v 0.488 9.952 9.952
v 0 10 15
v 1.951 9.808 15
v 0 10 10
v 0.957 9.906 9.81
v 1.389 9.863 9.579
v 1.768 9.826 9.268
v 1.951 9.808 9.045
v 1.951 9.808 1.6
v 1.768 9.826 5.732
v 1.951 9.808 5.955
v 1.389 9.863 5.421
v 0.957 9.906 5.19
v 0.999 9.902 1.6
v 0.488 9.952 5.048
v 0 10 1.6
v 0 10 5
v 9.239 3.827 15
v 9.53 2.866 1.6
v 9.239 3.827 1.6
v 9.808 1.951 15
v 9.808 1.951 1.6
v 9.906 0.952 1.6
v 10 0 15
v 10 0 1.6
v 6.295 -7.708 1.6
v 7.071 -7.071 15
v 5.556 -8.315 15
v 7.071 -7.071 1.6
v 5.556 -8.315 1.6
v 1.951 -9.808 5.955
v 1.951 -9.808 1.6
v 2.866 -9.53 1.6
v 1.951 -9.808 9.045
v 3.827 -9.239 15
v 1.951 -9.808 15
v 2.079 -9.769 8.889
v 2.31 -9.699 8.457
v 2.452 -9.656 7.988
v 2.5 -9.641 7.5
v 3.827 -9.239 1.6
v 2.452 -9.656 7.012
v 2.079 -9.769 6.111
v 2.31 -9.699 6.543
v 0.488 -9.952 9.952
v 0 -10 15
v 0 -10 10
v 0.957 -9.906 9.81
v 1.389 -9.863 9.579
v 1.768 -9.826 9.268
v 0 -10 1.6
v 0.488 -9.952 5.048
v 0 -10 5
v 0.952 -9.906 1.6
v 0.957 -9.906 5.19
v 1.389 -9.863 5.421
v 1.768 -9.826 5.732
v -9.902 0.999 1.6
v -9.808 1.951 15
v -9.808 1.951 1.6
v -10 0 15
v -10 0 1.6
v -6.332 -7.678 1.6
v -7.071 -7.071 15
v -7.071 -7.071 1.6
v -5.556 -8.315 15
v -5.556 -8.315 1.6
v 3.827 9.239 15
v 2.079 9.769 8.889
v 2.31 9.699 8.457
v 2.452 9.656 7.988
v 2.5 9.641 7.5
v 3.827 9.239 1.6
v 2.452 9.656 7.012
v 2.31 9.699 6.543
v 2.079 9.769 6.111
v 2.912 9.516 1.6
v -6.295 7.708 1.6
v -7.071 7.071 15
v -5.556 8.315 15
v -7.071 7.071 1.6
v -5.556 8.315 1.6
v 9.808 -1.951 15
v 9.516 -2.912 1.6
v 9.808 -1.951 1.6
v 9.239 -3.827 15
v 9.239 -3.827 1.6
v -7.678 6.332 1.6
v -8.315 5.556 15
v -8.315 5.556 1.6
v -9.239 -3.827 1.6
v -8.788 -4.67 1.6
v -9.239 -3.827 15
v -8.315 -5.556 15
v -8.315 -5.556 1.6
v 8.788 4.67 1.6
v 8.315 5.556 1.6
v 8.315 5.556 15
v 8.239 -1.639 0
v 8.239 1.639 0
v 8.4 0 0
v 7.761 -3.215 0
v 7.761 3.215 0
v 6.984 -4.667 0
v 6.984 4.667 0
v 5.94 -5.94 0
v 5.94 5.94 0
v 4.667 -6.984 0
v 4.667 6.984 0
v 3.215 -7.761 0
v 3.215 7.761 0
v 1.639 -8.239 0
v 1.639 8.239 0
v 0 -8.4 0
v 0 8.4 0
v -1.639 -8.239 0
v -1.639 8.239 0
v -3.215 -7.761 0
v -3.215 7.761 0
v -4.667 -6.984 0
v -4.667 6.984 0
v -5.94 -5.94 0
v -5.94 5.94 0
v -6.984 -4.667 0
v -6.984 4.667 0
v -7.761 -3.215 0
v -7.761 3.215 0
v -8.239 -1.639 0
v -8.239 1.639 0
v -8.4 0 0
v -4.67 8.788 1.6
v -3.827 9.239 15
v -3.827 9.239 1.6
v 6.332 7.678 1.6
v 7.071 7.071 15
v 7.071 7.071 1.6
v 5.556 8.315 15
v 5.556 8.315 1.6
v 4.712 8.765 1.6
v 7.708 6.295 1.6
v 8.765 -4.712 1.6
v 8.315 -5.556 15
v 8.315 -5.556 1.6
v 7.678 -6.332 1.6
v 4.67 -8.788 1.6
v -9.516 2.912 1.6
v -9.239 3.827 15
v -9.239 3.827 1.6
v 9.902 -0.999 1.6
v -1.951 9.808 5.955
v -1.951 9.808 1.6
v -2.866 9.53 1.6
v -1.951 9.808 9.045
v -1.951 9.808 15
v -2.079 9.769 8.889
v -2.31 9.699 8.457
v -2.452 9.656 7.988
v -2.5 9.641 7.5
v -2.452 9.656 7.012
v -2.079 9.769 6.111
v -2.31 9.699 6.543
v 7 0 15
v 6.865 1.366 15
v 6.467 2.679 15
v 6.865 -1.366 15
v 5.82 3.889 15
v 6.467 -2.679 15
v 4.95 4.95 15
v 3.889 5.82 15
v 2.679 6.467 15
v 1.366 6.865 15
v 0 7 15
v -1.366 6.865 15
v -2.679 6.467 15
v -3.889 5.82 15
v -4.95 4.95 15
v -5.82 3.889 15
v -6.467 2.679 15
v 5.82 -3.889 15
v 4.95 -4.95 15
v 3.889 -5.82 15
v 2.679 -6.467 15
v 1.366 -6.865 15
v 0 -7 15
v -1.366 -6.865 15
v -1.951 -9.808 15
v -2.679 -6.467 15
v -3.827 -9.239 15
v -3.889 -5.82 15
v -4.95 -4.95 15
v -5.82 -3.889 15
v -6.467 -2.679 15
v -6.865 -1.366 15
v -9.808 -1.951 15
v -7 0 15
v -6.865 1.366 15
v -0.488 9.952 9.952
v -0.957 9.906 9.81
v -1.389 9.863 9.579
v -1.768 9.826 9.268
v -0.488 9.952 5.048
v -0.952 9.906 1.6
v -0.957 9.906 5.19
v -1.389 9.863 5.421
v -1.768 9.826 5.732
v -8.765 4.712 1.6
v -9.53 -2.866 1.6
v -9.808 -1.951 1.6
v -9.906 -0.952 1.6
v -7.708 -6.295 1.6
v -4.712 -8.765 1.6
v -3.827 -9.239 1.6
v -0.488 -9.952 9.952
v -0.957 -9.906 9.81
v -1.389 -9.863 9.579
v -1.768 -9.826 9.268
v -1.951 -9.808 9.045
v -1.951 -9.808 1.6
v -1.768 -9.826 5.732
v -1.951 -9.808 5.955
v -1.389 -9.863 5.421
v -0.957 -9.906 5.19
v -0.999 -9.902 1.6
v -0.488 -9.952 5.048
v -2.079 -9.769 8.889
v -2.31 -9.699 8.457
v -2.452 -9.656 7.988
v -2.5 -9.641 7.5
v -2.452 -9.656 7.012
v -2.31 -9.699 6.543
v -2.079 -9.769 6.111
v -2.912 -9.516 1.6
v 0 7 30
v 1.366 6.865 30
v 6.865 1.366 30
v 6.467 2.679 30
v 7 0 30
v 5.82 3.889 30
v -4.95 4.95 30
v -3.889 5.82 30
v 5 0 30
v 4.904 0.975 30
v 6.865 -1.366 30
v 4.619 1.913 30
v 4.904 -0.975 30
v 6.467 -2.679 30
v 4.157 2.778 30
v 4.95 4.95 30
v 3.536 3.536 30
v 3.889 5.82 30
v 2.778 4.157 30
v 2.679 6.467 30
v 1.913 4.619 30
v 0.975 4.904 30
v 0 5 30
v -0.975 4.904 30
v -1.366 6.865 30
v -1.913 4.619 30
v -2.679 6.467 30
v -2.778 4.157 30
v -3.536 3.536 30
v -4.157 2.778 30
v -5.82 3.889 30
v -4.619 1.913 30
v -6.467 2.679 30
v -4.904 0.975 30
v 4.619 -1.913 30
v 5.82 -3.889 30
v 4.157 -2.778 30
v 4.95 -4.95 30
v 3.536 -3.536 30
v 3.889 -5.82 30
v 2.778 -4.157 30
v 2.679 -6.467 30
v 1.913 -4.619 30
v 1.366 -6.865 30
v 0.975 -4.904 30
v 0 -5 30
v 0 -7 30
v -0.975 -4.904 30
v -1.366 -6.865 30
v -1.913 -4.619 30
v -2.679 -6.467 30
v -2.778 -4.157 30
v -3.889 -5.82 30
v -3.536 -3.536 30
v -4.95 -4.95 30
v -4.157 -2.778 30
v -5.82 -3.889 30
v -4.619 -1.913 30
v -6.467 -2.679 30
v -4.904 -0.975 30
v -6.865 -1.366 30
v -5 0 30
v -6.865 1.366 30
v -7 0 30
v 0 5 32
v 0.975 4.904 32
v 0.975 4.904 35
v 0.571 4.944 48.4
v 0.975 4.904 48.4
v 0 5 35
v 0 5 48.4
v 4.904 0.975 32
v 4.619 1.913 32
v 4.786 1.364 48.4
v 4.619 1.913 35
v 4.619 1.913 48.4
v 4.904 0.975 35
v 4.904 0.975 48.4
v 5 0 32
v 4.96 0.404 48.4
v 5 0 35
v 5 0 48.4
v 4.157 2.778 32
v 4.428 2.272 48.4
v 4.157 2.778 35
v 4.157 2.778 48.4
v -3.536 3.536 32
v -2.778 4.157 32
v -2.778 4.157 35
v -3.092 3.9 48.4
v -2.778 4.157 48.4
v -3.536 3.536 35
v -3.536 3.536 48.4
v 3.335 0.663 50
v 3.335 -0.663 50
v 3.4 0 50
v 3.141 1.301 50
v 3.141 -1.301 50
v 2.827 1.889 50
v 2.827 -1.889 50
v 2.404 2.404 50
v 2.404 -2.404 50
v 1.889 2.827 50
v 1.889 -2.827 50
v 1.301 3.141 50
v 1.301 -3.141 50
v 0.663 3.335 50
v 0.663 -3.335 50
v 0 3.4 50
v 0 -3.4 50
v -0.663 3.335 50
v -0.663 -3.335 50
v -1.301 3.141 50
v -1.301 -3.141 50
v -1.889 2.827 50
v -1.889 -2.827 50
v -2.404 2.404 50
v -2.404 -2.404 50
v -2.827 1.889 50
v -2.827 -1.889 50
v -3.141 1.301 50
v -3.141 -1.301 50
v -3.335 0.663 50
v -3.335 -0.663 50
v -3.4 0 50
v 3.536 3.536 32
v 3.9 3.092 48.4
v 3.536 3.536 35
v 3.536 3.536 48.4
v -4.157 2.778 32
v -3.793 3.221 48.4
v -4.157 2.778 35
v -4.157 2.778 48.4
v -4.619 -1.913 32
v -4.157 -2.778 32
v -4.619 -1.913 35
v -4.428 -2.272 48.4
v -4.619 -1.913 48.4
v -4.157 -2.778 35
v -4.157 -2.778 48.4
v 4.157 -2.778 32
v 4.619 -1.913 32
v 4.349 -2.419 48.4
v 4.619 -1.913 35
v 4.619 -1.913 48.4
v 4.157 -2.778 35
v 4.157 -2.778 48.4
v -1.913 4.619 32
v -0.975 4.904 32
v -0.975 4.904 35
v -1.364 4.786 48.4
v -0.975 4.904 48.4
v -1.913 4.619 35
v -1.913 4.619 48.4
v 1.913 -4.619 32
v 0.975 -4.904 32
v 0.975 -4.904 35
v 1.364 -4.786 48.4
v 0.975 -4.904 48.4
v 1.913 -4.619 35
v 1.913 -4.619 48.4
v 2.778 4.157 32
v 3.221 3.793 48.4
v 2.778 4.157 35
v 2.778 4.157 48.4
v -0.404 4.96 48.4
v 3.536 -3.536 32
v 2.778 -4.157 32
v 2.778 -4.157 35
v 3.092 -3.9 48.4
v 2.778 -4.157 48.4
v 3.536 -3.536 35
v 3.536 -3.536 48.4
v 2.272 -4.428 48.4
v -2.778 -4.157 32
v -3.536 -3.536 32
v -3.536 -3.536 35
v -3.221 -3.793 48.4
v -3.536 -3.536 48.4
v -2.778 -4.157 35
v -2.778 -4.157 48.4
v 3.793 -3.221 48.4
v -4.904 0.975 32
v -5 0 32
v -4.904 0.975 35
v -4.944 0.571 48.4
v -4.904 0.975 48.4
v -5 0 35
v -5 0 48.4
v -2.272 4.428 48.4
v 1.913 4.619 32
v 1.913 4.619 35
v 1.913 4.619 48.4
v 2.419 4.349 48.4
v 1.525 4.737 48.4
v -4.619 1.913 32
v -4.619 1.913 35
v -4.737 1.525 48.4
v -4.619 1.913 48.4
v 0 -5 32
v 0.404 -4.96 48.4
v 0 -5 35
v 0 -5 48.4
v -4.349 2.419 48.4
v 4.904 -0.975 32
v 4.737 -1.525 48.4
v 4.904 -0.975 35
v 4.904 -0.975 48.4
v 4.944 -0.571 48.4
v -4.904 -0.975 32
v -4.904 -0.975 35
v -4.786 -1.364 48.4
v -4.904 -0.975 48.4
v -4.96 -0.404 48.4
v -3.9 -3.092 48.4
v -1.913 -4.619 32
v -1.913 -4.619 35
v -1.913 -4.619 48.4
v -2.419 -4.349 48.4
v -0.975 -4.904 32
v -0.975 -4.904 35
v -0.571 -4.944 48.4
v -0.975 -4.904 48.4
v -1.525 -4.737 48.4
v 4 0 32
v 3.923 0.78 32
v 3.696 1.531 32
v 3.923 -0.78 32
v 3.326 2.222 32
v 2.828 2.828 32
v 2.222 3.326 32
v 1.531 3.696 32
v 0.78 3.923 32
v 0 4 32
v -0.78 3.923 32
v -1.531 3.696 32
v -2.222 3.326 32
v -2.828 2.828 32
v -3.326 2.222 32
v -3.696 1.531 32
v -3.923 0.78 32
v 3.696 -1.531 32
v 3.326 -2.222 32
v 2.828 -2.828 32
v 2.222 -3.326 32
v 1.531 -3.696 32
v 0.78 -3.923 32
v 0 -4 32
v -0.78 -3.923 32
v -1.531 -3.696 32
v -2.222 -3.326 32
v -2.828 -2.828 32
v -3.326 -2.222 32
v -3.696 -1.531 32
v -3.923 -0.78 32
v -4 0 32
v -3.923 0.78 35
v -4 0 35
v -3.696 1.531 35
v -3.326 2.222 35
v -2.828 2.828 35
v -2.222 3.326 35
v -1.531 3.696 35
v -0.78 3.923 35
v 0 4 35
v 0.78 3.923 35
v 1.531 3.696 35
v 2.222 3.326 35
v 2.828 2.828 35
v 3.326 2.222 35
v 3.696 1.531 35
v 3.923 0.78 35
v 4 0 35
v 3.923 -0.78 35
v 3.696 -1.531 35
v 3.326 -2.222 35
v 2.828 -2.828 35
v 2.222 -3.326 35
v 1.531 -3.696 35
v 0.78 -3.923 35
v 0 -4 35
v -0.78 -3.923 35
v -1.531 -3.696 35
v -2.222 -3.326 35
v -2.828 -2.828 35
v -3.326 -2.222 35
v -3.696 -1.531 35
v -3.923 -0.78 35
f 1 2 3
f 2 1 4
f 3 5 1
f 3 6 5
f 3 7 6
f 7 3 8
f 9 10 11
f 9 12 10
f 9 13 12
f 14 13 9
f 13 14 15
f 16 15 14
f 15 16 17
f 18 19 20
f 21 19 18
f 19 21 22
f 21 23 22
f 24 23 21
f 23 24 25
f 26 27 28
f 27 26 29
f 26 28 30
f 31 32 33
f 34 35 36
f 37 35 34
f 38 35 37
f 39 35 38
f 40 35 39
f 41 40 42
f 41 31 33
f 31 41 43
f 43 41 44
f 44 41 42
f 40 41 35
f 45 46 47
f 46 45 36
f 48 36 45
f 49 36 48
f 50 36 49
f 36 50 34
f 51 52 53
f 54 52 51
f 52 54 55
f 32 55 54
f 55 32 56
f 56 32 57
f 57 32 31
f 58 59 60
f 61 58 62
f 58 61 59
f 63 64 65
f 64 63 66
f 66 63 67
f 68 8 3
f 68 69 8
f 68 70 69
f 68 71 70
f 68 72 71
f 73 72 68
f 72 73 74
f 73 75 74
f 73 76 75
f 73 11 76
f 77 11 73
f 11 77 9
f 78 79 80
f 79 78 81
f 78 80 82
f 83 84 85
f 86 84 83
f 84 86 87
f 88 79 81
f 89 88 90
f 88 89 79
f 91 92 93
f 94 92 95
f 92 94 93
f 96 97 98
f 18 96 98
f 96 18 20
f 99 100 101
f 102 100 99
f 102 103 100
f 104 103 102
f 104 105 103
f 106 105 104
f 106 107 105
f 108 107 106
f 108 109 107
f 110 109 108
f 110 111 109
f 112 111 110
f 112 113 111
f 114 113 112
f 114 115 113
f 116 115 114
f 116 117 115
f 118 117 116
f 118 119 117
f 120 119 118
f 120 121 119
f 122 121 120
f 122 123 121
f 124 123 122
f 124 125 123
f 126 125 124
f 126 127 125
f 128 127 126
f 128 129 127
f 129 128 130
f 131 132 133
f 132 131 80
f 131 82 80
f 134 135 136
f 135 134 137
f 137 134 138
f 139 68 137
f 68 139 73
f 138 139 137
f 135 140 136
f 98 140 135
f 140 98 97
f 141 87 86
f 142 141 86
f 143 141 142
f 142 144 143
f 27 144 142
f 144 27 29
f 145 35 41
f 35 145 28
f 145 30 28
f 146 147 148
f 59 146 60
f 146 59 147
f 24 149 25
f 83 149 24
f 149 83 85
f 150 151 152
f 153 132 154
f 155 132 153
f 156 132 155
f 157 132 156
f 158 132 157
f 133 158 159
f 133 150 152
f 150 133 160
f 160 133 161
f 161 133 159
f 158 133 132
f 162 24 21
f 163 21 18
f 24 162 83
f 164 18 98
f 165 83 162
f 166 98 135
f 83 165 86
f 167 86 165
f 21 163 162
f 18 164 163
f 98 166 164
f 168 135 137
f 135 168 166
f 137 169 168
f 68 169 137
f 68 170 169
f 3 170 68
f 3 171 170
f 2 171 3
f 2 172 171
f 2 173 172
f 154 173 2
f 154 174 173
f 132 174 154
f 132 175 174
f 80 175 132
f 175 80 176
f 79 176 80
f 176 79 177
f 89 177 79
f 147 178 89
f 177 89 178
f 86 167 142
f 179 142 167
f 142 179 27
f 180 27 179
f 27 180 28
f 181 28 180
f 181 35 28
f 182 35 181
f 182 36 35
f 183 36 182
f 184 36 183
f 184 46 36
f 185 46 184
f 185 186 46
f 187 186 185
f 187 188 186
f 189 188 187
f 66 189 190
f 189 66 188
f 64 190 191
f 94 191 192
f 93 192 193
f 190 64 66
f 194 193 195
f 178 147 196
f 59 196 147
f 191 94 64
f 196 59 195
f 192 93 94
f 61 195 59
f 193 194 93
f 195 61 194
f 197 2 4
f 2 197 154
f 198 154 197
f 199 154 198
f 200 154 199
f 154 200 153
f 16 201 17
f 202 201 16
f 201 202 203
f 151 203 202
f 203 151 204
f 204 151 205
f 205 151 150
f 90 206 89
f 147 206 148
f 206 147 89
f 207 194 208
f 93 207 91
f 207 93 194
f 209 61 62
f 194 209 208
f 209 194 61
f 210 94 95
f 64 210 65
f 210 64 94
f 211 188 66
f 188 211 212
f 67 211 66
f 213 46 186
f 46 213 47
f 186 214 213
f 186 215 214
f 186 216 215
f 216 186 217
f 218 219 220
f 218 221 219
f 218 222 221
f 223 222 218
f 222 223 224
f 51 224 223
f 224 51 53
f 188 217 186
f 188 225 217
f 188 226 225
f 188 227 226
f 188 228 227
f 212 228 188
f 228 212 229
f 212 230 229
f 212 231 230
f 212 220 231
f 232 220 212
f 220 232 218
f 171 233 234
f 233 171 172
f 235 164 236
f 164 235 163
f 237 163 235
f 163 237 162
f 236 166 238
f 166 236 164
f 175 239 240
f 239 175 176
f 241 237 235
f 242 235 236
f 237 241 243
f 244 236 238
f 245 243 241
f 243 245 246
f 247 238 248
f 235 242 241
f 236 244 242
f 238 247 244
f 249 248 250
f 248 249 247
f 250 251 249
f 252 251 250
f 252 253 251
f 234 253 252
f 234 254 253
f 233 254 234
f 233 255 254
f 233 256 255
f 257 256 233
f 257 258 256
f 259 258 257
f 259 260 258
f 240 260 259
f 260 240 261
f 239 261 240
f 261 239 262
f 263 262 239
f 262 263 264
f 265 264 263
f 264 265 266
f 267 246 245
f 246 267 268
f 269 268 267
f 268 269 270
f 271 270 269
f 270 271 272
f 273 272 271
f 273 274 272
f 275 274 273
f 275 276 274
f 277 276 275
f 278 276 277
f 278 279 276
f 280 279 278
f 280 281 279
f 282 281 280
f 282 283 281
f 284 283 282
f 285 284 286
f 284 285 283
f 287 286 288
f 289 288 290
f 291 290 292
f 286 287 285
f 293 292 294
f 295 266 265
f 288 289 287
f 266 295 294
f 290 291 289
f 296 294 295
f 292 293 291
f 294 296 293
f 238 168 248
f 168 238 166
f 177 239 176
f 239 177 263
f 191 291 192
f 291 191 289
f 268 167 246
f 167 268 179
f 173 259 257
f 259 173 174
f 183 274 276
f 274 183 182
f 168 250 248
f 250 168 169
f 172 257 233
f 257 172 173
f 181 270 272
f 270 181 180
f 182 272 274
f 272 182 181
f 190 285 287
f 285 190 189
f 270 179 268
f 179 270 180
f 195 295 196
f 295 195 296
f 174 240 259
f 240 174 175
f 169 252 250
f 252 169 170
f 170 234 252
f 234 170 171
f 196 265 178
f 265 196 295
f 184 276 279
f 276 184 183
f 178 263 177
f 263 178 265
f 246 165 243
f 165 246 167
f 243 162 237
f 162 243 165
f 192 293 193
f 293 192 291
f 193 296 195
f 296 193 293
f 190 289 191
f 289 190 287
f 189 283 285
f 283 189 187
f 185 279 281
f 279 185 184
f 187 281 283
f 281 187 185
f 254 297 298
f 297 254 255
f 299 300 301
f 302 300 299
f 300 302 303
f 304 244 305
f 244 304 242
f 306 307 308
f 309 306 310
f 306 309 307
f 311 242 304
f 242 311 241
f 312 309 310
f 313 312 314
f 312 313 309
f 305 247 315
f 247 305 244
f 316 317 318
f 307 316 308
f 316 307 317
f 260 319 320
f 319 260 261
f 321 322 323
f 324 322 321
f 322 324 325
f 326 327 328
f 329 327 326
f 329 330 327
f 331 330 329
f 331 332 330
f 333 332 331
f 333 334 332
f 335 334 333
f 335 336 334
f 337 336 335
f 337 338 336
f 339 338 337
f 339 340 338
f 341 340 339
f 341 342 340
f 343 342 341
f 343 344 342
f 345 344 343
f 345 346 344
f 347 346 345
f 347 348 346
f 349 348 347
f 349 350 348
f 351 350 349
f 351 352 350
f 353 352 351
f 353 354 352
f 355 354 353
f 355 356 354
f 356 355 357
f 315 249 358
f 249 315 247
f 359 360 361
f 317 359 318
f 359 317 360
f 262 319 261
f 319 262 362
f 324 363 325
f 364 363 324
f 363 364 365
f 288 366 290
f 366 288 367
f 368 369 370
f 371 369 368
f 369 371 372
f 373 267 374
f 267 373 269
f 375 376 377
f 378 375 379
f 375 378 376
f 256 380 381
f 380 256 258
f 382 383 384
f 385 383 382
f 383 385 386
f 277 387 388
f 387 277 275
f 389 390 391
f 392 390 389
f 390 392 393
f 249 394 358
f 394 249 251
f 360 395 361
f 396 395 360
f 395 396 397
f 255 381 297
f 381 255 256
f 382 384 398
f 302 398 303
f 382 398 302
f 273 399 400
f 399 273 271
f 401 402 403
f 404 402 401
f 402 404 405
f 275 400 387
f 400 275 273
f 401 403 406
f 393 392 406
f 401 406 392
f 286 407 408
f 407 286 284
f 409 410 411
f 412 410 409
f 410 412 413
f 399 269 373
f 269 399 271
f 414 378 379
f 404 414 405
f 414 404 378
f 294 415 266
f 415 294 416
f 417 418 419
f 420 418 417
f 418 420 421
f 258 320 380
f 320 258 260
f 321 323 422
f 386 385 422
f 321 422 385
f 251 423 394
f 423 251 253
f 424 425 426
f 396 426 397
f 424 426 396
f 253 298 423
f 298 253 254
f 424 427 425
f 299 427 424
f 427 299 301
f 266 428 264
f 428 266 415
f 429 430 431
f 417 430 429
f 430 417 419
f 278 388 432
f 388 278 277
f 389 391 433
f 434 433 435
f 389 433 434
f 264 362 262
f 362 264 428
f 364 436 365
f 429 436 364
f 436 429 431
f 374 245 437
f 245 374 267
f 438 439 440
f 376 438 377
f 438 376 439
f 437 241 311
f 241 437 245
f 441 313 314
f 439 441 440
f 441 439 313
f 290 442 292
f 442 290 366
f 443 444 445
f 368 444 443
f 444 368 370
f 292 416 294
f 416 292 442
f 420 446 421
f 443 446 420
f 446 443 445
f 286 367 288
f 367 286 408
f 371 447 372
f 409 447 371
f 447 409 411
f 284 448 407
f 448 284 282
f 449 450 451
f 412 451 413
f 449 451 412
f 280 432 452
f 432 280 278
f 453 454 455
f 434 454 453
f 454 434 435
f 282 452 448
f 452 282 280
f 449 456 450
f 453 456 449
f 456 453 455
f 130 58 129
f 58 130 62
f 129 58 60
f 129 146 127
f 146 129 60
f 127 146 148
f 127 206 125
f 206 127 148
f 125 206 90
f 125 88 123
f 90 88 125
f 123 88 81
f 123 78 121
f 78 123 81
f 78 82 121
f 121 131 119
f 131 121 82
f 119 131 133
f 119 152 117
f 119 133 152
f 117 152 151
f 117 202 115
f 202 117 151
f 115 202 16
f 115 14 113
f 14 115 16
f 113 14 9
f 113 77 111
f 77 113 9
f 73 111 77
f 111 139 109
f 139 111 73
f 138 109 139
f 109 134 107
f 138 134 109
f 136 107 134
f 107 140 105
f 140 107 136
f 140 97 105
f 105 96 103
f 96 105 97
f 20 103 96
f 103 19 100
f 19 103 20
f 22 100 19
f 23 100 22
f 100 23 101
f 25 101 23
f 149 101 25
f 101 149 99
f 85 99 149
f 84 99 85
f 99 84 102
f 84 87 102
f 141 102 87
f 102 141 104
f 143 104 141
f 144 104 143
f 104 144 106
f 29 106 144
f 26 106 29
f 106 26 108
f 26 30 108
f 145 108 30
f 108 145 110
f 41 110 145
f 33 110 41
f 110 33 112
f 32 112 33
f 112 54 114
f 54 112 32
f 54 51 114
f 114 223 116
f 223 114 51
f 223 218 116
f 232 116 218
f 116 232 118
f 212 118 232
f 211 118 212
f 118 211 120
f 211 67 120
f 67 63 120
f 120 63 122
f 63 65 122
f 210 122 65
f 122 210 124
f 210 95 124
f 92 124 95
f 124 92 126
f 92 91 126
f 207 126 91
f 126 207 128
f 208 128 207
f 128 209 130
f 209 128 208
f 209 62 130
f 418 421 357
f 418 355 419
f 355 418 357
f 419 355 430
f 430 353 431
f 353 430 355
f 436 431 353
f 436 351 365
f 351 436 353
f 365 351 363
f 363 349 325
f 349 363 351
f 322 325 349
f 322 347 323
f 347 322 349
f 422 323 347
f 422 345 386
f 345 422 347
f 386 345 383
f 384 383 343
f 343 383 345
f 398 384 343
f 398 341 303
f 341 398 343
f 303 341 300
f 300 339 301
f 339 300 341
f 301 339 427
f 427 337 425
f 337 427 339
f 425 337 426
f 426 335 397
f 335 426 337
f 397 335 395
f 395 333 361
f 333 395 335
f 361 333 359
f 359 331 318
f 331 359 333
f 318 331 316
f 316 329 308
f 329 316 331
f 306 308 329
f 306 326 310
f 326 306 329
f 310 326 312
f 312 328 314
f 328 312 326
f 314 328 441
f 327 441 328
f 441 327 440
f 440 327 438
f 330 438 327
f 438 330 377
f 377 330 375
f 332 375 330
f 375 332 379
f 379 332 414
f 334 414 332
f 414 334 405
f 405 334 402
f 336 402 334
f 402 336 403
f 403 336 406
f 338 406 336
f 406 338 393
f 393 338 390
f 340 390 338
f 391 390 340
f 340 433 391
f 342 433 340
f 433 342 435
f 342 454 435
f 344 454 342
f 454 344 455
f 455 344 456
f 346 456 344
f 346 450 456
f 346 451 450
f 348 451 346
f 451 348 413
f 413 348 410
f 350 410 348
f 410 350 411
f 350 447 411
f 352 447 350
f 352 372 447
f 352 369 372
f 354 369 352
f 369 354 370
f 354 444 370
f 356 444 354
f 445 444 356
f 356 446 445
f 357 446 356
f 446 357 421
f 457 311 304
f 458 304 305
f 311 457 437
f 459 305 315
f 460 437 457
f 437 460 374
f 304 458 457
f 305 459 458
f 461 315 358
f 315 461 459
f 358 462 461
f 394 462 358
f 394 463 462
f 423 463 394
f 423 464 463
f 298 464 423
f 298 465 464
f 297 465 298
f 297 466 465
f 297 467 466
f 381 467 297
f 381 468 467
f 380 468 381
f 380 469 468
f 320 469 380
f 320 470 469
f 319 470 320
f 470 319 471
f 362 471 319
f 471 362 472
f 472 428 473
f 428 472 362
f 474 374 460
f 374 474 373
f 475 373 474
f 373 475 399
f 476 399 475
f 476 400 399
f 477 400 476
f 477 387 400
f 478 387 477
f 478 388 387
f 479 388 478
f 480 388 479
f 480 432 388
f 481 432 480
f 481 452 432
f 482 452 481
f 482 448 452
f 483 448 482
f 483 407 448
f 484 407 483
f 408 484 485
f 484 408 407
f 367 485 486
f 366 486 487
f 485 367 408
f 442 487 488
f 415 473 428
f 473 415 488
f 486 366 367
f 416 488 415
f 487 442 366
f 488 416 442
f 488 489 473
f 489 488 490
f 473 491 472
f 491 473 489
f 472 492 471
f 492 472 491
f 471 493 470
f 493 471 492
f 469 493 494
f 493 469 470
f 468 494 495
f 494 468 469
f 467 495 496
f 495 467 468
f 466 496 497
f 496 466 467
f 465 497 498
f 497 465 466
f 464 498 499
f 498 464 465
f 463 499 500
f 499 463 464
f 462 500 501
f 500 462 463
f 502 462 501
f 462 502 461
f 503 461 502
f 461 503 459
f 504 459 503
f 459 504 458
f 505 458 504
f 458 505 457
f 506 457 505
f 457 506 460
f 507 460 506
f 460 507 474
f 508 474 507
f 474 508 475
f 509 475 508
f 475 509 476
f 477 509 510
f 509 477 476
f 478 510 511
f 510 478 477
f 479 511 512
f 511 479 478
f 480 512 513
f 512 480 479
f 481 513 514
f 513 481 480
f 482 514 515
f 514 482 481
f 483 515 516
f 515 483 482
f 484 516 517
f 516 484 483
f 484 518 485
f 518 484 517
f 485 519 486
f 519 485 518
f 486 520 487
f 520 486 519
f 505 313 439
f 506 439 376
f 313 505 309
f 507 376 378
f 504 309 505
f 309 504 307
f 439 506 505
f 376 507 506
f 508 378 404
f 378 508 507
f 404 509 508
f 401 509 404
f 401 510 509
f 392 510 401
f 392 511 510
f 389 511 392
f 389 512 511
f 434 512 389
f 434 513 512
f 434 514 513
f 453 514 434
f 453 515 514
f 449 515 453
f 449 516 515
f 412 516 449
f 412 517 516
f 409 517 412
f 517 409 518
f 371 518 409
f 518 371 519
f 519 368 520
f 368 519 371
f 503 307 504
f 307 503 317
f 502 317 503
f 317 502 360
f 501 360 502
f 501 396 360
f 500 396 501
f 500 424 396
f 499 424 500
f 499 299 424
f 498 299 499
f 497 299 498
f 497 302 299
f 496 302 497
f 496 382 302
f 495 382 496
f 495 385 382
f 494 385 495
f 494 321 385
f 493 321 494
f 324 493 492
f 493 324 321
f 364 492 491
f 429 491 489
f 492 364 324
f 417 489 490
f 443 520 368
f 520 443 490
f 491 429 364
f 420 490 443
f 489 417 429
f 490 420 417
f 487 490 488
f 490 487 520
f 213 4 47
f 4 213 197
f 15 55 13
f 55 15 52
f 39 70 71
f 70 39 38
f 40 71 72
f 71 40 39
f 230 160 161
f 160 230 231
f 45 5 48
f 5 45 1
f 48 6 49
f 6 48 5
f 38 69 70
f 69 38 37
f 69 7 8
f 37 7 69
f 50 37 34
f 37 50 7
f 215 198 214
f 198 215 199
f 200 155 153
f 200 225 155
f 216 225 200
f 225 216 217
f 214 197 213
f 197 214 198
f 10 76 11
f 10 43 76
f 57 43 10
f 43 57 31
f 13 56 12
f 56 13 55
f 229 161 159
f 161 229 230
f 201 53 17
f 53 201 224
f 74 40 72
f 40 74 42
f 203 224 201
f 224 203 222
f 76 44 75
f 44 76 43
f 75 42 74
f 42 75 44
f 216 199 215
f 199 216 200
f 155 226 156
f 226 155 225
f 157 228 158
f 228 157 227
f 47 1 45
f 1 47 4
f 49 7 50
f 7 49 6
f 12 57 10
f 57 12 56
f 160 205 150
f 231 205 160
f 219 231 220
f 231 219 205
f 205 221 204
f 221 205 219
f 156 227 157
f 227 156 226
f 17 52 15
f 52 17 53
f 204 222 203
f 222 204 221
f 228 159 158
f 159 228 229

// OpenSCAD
$fn = 32;

// ----------------------------------------------------------------------
// Stepped shaft: diameters 20, 14, 10 mm, 50 mm long
// ----------------------------------------------------------------------

// --- parameters (mm) ---
d1 = 20;                  // step 1 diameter
len1 = 15;                // step 1 length
d2 = 14;                  // step 2 diameter
len2 = 15;                // step 2 length
d3 = 10;                  // step 3 diameter
len3 = 20;                // step 3 length
total = 50;               // overall length
chamfer = 1.6;            // end chamfer
groove_r = 5;             // groove radius
groove_z = 32;            // groove position from the end
groove_w = 3;             // groove width
groove_d = 1;             // groove depth
cross_d = 5;              // cross pin hole
cross_z = 7.5;            // cross hole position

difference() {
  /* turned body: stacked cylinders, every step sunk into the bigger one */
  union() {
    cylinder(h = len1, d = d1);
    translate([0, 0, 14.6]) cylinder(h = 15.4, d = d2);
    translate([0, 0, 29.6]) cylinder(h = 20.4, d = d3);
  }
  /* bottom chamfer ring cut */
  rotate_extrude() translate([8.4, -2.5]) polygon([[0, 0], [4.1, 0], [4.1, 6.6], [0, 2.5]]);
  /* top chamfer ring cut */
  rotate_extrude() translate([3.4, 50]) polygon([[0, 0], [4.1, -4.1], [4.1, 2.5], [0, 2.5]]);
  /* circlip groove just behind the shoulder */
  rotate_extrude() translate([groove_r - groove_d, groove_z]) square([groove_d + 2.5, groove_w]);
  /* cross pin hole through the small step */
  translate([0, 0, cross_z]) rotate([90, 0, 0]) cylinder(h = d1 + 5, d = cross_d, center = true);
}
